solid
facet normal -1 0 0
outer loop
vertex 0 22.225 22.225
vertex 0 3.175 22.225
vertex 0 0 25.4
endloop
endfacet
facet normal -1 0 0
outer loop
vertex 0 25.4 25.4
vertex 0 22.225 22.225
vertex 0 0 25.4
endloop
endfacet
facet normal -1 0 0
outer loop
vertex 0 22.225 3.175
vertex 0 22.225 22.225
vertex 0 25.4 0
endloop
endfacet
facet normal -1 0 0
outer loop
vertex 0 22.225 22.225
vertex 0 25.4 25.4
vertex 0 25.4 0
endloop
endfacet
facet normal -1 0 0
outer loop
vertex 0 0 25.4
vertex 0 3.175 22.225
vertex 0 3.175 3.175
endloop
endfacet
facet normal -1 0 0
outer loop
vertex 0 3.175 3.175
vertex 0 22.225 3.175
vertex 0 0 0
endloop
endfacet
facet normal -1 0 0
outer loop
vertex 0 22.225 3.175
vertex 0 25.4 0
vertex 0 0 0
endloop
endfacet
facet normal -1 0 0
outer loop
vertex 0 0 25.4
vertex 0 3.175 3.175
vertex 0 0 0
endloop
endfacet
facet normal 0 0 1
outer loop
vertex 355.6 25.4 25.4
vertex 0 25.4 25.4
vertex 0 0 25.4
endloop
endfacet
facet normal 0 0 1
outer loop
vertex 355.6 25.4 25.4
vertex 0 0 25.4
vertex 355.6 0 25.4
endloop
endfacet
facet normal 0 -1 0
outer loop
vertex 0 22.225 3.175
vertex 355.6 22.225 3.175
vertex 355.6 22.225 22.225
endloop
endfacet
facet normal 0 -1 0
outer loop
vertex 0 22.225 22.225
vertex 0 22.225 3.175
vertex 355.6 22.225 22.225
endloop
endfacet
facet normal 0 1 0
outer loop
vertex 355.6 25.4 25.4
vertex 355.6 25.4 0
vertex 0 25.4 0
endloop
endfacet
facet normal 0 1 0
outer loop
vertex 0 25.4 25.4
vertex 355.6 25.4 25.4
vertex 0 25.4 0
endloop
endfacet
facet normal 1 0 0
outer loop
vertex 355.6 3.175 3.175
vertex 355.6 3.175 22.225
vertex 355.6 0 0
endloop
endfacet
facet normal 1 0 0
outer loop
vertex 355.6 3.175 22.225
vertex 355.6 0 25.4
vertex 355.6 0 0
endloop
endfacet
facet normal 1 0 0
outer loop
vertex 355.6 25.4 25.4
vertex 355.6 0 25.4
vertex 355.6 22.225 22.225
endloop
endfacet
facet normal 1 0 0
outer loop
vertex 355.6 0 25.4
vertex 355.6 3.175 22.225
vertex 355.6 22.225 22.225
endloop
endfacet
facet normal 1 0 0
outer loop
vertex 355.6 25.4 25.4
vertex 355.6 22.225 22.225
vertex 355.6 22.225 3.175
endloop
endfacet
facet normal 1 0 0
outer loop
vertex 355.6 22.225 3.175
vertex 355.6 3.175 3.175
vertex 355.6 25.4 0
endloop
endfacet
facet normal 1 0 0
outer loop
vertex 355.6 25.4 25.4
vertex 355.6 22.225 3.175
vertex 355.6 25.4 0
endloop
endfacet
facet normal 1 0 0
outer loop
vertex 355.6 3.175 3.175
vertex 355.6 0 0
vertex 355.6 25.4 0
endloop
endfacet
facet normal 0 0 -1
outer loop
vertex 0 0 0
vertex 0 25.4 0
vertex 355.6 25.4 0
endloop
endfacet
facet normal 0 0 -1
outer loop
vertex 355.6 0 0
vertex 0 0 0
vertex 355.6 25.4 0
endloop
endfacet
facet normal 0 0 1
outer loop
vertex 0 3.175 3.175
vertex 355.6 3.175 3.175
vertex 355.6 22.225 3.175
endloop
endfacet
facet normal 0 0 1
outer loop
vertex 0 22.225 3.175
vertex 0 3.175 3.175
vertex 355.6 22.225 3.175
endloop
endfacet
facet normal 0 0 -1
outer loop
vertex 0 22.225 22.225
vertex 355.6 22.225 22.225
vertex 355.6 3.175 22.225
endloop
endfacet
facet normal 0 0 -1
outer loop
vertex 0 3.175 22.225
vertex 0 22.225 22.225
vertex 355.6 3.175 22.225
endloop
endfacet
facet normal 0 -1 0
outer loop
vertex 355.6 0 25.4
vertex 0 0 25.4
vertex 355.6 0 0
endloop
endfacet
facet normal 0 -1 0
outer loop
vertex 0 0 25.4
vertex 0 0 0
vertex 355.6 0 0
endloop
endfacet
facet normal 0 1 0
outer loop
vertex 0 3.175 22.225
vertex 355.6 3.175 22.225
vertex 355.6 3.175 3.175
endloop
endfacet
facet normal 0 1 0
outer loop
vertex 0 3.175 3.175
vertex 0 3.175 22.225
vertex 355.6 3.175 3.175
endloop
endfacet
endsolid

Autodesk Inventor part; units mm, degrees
ref_plane "YZ Plane" through (0, 0, 0) normal (1, 0, 0) x (0, 1, 0)
ref_plane "XZ Plane" through (0, 0, 0) normal (0, 1, 0) x (-1, 0, 0)
ref_plane "XY Plane" through (0, 0, 0) normal (0, 0, 1) x (1, 0, 0)
sketch "Sketch1" plane through (0, 0, 0) normal (0, 0, 1) x (1, 0, 0)
  line L0 (0, 0) -> (355.6, 0)
  line L1 (355.6, 0) -> (355.6, 25.4)
  line L2 (355.6, 25.4) -> (0, 25.4)
  line L3 (0, 25.4) -> (0, 0)
  dimension "d0" = 355.6
  dimension "d1" = 25.4
extrude "Extrusion1" add sketch "Sketch1" along normal blind 25.4
sketch "Sketch2" plane through (355.6, 0, 0) normal (1, 0, 0) x (0, 0, -1)
  line L0 (-22.225, 3.175) -> (-3.175, 3.175)
  line L1 (-3.175, 3.175) -> (-3.175, 22.225)
  line L2 (-3.175, 22.225) -> (-22.225, 22.225)
  line L3 (-22.225, 22.225) -> (-22.225, 3.175)
  line L4 (-22.225, 3.175) -> (-3.175, 22.225) construction
  line L5 (-3.175, 3.175) -> (-22.225, 22.225) construction
  point P0 (-12.7, 12.7)
  dimension "d4" = 19.05
  dimension "d5" = 19.05
extrude "Extrusion2" cut sketch "Sketch2" against normal blind 355.6
properties part number "west coast backfront"
